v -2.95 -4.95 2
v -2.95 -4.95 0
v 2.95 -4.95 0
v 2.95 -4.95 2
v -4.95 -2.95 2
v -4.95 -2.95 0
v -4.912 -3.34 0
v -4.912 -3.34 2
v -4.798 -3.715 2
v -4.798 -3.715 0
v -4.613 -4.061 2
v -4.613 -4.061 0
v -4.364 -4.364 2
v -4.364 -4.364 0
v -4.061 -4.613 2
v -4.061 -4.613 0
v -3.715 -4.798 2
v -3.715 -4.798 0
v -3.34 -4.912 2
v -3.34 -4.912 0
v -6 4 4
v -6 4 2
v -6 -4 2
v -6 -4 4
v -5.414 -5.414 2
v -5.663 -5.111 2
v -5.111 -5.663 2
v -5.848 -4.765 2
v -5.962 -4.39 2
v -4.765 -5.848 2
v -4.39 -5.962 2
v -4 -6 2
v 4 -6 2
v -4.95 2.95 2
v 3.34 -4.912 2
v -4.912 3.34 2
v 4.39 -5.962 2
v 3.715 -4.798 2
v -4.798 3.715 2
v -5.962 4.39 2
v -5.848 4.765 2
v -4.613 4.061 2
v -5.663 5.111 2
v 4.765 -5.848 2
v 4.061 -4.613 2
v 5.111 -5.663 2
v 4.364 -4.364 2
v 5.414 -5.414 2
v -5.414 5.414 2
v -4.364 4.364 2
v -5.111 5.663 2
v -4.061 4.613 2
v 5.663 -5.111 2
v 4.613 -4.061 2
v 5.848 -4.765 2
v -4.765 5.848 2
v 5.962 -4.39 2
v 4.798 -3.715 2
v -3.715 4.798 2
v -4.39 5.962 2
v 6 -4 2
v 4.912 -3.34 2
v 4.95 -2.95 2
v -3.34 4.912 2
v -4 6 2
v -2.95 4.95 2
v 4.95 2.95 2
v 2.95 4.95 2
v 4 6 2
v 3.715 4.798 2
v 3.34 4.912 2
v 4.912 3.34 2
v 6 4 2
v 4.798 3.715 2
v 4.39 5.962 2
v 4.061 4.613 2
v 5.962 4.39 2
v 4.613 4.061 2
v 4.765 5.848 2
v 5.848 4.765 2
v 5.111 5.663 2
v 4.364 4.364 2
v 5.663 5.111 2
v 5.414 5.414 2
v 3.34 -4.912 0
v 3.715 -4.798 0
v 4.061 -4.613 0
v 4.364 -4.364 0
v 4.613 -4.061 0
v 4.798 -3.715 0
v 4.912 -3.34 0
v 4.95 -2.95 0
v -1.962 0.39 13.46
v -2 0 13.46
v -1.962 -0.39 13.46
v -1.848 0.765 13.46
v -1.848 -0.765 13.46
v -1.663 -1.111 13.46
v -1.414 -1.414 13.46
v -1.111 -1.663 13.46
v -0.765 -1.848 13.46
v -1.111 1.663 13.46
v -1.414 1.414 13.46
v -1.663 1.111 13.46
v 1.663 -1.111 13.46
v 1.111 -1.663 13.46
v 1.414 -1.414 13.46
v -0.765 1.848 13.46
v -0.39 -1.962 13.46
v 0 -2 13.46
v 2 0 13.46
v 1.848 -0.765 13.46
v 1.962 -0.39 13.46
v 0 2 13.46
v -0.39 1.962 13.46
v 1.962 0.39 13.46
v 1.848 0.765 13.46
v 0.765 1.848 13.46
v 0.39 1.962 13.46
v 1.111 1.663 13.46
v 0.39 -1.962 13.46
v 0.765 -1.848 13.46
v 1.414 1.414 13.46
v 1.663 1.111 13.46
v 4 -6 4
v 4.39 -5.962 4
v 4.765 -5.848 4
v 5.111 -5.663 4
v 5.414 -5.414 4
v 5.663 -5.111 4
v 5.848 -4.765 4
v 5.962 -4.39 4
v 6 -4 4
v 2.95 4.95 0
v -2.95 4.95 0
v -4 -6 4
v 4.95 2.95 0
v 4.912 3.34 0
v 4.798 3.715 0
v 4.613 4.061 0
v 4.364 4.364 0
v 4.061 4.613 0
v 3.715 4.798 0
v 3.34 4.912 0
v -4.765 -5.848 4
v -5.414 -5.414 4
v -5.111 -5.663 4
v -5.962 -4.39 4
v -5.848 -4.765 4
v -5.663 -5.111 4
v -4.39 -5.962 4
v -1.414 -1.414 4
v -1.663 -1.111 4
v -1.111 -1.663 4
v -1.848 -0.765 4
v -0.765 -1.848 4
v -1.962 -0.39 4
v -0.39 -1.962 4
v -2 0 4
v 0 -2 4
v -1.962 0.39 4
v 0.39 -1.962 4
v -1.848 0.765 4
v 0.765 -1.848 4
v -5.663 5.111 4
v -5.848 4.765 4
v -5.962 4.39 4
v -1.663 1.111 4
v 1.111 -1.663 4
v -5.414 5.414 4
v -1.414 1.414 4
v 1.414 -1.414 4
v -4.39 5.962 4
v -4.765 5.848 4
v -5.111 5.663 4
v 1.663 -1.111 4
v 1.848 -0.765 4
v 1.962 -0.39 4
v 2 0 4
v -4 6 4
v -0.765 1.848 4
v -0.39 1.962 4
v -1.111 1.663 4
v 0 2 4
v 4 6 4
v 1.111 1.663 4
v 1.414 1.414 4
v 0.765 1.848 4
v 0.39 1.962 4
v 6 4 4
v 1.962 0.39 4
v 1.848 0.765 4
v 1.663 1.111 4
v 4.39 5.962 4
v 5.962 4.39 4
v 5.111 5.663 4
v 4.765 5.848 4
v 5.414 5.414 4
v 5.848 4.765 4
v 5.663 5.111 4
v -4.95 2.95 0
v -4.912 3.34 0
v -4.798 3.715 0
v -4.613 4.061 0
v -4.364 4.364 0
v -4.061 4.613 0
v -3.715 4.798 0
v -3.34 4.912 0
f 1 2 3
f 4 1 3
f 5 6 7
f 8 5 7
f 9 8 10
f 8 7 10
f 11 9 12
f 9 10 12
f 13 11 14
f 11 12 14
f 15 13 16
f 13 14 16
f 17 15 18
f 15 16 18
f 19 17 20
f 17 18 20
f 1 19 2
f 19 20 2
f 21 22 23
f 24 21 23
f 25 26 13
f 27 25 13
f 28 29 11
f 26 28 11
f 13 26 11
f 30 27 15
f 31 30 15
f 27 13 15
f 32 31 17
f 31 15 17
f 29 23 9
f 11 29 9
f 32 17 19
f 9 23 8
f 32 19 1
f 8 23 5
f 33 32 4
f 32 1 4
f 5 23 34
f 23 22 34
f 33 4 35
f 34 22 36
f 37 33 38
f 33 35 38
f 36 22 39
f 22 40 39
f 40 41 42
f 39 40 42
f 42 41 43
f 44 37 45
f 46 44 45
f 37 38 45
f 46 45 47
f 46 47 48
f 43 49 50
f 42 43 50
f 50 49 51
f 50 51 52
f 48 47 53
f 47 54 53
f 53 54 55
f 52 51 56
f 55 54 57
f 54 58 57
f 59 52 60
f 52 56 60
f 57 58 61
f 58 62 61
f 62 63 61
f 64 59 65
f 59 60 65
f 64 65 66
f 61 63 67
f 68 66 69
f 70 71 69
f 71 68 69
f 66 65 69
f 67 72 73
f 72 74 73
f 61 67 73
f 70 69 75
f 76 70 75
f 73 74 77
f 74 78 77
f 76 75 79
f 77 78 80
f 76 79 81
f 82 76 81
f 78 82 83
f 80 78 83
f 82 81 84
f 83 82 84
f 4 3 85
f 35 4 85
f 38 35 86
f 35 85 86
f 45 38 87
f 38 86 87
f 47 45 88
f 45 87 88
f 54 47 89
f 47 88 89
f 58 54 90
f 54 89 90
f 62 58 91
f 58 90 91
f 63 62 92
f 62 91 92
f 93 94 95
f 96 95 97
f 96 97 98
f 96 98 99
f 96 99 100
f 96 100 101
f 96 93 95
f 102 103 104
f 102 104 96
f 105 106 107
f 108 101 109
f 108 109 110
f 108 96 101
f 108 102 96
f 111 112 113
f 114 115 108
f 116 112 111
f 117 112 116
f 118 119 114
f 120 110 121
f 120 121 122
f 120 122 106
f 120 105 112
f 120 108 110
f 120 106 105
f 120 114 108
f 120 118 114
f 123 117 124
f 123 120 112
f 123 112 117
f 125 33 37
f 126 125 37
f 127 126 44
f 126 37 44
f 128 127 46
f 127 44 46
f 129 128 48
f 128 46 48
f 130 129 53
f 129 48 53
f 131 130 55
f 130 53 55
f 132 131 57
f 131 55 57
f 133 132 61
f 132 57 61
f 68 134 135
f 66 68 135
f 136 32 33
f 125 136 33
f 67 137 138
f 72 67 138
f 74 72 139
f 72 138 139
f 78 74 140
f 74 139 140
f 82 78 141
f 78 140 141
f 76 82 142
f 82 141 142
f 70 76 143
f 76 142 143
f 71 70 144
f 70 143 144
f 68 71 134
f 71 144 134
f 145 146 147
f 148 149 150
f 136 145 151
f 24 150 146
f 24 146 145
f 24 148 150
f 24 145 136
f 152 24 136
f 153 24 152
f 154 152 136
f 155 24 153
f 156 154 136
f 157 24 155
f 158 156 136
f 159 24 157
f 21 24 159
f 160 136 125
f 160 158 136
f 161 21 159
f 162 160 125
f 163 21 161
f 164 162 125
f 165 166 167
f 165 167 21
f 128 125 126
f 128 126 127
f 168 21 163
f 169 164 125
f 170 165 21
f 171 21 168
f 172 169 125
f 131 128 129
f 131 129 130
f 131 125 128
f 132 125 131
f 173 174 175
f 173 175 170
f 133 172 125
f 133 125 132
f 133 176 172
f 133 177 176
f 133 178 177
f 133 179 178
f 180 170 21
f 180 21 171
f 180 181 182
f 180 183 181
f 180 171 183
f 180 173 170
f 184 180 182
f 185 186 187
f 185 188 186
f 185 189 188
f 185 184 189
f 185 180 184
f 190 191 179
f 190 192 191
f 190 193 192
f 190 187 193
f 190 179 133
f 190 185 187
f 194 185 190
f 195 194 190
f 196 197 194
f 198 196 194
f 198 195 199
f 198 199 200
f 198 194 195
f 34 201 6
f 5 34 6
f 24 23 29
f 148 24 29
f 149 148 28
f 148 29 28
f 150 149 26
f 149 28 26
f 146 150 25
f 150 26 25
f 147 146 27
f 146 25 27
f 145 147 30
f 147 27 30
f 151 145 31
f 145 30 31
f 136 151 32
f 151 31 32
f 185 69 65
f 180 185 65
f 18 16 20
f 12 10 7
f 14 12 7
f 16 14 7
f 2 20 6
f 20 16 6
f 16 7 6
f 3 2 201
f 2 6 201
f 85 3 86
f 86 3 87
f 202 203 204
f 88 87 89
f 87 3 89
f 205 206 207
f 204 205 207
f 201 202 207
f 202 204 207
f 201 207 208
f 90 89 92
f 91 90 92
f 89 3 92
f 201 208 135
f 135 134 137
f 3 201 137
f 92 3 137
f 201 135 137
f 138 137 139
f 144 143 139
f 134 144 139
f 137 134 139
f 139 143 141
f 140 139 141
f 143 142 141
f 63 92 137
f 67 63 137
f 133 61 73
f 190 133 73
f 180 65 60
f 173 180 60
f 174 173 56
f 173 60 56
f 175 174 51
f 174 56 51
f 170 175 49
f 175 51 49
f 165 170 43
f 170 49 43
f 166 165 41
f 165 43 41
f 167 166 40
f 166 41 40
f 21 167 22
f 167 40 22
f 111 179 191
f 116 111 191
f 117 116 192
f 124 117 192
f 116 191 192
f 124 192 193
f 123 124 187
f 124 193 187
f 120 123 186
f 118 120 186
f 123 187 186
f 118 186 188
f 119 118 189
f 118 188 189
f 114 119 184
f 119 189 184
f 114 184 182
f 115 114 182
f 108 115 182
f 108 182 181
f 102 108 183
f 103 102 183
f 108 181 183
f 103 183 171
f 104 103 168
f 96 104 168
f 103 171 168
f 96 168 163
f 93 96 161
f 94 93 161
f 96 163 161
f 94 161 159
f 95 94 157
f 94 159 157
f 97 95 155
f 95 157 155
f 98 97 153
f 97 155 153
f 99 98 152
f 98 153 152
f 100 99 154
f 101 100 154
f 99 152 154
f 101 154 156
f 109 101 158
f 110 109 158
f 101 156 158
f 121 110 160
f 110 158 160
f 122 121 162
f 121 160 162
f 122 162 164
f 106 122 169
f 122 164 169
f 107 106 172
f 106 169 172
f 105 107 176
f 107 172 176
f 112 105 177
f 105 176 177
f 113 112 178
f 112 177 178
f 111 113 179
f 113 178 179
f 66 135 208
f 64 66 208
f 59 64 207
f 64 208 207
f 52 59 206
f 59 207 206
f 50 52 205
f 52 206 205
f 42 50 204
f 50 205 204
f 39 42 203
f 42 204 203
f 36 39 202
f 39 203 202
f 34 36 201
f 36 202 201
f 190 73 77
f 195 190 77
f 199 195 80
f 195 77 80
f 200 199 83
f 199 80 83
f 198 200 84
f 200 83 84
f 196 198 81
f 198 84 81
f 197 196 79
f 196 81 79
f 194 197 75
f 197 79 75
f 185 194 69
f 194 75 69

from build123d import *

# Parameters (mm, degrees)
F1_DEPTH = 2
F3_DEPTH = 2
F4_R     = 2
F5_DEPTH = 9.46


with BuildPart() as f1:
    # F0 (on Top) → F1 (new body)
    with BuildSketch(Plane.XY):
        with BuildLine():
            Line((-2.95, -4.95), (2.95, -4.95))
            ThreePointArc((2.95, -4.95), (4.364214, -4.364214), (4.95, -2.95))
            Line((4.95, -2.95), (4.95, 2.95))
            ThreePointArc((4.95, 2.95), (4.364214, 4.364214), (2.95, 4.95))
            Line((2.95, 4.95), (-2.95, 4.95))
            ThreePointArc((-2.95, 4.95), (-4.364214, 4.364214), (-4.95, 2.95))
            Line((-4.95, 2.95), (-4.95, -2.95))
            ThreePointArc((-4.95, -2.95), (-4.364214, -4.364214), (-2.95, -4.95))
        make_face()
    extrude(amount=F1_DEPTH)

    # F2 (on face) → F3 (join)
    with BuildSketch(Plane.XY.offset(2)):
        with BuildLine():
            Line((-4, -6), (4, -6))
            ThreePointArc((4, -6), (5.414214, -5.414214), (6, -4))
            Line((6, -4), (6, 4))
            ThreePointArc((6, 4), (5.414214, 5.414214), (4, 6))
            Line((4, 6), (-4, 6))
            ThreePointArc((-4, 6), (-5.414214, 5.414214), (-6, 4))
            Line((-6, 4), (-6, -4))
            ThreePointArc((-6, -4), (-5.414214, -5.414214), (-4, -6))
        make_face()
    extrude(amount=F3_DEPTH)

    # F4 (on face) → F5 (join)
    with BuildSketch(Plane.XY.offset(4)):
        Circle(F4_R)
    extrude(amount=F5_DEPTH)


solid = f1.part
